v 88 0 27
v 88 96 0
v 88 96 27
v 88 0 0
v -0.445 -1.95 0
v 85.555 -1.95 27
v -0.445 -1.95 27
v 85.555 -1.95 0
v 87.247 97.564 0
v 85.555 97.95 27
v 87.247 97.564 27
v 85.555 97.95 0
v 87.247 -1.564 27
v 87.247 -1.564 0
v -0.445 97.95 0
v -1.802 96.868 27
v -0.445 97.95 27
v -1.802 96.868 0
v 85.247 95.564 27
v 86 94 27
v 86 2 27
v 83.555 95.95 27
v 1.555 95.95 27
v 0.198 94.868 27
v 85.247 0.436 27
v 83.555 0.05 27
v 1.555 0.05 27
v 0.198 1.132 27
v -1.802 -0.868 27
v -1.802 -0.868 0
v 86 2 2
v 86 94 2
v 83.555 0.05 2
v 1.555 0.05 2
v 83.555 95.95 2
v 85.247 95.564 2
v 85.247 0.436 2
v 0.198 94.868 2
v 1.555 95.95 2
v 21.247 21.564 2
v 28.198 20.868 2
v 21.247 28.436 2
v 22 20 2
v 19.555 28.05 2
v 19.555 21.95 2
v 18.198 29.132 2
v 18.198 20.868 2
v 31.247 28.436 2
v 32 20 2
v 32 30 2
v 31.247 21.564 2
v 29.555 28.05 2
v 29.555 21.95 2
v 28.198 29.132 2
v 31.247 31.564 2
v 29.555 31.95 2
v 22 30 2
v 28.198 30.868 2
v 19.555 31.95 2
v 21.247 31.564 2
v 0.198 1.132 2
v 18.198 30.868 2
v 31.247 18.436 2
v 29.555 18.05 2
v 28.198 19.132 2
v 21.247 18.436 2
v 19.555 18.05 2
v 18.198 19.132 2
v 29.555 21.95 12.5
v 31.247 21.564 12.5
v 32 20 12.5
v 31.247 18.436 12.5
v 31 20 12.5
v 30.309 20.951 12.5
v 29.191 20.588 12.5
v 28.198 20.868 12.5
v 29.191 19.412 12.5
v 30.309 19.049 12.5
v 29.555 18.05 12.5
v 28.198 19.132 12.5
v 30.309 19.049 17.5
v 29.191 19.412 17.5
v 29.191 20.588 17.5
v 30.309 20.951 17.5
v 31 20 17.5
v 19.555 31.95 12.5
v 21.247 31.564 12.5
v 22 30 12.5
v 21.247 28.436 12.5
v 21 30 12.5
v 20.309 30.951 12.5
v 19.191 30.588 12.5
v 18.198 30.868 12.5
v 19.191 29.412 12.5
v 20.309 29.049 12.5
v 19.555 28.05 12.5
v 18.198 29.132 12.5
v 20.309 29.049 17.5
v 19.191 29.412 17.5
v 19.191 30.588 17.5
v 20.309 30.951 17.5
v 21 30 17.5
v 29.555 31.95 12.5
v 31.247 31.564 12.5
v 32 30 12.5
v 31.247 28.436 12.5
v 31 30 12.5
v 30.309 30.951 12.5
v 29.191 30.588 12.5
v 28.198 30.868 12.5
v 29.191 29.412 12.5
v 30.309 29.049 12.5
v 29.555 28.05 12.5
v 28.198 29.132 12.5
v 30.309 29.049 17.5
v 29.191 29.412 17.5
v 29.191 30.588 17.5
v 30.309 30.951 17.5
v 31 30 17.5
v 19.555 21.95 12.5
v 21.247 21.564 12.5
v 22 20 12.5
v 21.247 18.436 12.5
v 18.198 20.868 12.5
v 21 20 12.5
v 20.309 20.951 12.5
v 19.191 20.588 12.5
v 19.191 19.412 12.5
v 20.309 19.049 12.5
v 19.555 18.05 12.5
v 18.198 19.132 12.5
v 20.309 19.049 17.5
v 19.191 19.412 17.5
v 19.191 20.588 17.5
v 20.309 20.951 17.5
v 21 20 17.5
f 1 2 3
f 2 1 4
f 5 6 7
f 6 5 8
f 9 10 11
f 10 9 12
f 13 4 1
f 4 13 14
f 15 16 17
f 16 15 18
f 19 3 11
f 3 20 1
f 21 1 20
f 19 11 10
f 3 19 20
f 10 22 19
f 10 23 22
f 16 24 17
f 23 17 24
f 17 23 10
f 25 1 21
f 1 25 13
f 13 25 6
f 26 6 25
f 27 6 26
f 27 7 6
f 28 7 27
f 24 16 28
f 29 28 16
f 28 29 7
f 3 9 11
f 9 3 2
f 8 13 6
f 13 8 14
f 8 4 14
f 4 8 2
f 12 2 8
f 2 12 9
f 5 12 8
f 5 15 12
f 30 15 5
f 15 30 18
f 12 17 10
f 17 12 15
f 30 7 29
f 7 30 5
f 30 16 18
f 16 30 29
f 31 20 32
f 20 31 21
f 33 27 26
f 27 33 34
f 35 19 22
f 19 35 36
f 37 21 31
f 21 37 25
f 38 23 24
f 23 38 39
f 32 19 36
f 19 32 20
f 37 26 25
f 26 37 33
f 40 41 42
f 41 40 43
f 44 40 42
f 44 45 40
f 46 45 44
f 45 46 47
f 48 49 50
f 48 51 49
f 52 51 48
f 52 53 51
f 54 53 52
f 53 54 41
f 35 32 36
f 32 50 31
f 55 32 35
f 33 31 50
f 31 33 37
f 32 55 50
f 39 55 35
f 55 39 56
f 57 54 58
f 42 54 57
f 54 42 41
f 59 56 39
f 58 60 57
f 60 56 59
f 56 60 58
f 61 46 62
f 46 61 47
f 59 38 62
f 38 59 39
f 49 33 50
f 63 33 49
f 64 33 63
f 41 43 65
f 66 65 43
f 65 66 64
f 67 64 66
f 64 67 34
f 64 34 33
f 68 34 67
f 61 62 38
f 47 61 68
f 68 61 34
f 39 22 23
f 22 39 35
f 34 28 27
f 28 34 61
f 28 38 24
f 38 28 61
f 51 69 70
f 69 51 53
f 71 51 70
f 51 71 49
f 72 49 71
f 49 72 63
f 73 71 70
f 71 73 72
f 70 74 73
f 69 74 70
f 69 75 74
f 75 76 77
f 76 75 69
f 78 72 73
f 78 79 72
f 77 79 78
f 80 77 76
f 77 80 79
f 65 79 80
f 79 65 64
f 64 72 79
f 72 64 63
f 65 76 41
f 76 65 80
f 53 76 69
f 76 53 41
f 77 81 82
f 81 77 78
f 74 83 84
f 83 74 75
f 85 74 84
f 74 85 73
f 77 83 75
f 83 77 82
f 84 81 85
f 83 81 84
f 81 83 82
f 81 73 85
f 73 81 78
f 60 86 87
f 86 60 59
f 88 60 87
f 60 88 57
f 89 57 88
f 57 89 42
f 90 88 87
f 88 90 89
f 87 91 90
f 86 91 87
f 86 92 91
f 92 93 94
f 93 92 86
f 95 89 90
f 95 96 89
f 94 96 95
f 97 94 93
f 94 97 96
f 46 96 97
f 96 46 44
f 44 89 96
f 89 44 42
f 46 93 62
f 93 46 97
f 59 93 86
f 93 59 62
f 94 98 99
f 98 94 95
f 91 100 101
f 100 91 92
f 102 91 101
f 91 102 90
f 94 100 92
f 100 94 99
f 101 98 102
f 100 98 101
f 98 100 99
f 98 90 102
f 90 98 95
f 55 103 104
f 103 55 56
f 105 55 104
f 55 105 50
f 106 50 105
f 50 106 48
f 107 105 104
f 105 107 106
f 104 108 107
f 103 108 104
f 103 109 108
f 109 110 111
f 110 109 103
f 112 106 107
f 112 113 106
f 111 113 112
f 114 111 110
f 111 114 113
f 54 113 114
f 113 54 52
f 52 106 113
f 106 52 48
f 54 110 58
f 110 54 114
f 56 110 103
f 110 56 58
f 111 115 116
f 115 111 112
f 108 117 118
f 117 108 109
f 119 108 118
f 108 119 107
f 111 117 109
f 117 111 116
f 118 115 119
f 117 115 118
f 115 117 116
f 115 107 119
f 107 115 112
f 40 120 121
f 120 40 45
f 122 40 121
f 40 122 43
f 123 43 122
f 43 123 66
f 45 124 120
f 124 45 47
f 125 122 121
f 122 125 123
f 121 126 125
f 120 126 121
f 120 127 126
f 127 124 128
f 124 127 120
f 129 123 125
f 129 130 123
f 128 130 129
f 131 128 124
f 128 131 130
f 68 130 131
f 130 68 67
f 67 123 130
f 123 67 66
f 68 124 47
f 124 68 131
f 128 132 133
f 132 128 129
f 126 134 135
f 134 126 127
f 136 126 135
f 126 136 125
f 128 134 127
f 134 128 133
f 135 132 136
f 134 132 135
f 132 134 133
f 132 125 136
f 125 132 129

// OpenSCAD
// Case size
case_thickness = 2;
case_width = 86;
case_length = 96;
case_height = 25;

module pin_mount(base_r, base_h, pin_r, pin_h, sep_x, sep_y) {
    cylinder(r=base_r, h=base_h);
    cylinder(r=pin_r, h=pin_h);

    translate([sep_x, 0, 0]) {
        cylinder(r=base_r, h=base_h);
        cylinder(r=pin_r, h=pin_h);
    }

    translate([0, sep_y, 0]) {
        cylinder(r=base_r, h=base_h);
        cylinder(r=pin_r, h=pin_h);
    }

    translate([sep_x, sep_y, 0]) {
        cylinder(r=base_r, h=base_h);
        cylinder(r=pin_r, h=pin_h);
    }
}

module case_bottom(w, l, h, thickness) {
    //bottom plate and outside with rounded edges
    color("DarkCyan") {
        difference() {
            minkowski() {
                cube([w, l, h]);
                cylinder(r=2, h=thickness);
            };
            translate([thickness, thickness, thickness])
                minkowski() {
                    cube([w - (thickness*2), l - (thickness*2), h]);
                    cylinder(r=2, h=thickness);
                };
        }
    }

    //NodeMCU Mount Pins
    translate([20, 20, 0])
        pin_mount(
            base_r=2, base_h=case_height/2,
            pin_r=1, pin_h=case_height*0.7,
            sep_x=10, sep_y=10
        );
}

case_bottom(
    w=case_width,
    l=case_length,
    h=case_height,
    thickness=case_thickness
);
